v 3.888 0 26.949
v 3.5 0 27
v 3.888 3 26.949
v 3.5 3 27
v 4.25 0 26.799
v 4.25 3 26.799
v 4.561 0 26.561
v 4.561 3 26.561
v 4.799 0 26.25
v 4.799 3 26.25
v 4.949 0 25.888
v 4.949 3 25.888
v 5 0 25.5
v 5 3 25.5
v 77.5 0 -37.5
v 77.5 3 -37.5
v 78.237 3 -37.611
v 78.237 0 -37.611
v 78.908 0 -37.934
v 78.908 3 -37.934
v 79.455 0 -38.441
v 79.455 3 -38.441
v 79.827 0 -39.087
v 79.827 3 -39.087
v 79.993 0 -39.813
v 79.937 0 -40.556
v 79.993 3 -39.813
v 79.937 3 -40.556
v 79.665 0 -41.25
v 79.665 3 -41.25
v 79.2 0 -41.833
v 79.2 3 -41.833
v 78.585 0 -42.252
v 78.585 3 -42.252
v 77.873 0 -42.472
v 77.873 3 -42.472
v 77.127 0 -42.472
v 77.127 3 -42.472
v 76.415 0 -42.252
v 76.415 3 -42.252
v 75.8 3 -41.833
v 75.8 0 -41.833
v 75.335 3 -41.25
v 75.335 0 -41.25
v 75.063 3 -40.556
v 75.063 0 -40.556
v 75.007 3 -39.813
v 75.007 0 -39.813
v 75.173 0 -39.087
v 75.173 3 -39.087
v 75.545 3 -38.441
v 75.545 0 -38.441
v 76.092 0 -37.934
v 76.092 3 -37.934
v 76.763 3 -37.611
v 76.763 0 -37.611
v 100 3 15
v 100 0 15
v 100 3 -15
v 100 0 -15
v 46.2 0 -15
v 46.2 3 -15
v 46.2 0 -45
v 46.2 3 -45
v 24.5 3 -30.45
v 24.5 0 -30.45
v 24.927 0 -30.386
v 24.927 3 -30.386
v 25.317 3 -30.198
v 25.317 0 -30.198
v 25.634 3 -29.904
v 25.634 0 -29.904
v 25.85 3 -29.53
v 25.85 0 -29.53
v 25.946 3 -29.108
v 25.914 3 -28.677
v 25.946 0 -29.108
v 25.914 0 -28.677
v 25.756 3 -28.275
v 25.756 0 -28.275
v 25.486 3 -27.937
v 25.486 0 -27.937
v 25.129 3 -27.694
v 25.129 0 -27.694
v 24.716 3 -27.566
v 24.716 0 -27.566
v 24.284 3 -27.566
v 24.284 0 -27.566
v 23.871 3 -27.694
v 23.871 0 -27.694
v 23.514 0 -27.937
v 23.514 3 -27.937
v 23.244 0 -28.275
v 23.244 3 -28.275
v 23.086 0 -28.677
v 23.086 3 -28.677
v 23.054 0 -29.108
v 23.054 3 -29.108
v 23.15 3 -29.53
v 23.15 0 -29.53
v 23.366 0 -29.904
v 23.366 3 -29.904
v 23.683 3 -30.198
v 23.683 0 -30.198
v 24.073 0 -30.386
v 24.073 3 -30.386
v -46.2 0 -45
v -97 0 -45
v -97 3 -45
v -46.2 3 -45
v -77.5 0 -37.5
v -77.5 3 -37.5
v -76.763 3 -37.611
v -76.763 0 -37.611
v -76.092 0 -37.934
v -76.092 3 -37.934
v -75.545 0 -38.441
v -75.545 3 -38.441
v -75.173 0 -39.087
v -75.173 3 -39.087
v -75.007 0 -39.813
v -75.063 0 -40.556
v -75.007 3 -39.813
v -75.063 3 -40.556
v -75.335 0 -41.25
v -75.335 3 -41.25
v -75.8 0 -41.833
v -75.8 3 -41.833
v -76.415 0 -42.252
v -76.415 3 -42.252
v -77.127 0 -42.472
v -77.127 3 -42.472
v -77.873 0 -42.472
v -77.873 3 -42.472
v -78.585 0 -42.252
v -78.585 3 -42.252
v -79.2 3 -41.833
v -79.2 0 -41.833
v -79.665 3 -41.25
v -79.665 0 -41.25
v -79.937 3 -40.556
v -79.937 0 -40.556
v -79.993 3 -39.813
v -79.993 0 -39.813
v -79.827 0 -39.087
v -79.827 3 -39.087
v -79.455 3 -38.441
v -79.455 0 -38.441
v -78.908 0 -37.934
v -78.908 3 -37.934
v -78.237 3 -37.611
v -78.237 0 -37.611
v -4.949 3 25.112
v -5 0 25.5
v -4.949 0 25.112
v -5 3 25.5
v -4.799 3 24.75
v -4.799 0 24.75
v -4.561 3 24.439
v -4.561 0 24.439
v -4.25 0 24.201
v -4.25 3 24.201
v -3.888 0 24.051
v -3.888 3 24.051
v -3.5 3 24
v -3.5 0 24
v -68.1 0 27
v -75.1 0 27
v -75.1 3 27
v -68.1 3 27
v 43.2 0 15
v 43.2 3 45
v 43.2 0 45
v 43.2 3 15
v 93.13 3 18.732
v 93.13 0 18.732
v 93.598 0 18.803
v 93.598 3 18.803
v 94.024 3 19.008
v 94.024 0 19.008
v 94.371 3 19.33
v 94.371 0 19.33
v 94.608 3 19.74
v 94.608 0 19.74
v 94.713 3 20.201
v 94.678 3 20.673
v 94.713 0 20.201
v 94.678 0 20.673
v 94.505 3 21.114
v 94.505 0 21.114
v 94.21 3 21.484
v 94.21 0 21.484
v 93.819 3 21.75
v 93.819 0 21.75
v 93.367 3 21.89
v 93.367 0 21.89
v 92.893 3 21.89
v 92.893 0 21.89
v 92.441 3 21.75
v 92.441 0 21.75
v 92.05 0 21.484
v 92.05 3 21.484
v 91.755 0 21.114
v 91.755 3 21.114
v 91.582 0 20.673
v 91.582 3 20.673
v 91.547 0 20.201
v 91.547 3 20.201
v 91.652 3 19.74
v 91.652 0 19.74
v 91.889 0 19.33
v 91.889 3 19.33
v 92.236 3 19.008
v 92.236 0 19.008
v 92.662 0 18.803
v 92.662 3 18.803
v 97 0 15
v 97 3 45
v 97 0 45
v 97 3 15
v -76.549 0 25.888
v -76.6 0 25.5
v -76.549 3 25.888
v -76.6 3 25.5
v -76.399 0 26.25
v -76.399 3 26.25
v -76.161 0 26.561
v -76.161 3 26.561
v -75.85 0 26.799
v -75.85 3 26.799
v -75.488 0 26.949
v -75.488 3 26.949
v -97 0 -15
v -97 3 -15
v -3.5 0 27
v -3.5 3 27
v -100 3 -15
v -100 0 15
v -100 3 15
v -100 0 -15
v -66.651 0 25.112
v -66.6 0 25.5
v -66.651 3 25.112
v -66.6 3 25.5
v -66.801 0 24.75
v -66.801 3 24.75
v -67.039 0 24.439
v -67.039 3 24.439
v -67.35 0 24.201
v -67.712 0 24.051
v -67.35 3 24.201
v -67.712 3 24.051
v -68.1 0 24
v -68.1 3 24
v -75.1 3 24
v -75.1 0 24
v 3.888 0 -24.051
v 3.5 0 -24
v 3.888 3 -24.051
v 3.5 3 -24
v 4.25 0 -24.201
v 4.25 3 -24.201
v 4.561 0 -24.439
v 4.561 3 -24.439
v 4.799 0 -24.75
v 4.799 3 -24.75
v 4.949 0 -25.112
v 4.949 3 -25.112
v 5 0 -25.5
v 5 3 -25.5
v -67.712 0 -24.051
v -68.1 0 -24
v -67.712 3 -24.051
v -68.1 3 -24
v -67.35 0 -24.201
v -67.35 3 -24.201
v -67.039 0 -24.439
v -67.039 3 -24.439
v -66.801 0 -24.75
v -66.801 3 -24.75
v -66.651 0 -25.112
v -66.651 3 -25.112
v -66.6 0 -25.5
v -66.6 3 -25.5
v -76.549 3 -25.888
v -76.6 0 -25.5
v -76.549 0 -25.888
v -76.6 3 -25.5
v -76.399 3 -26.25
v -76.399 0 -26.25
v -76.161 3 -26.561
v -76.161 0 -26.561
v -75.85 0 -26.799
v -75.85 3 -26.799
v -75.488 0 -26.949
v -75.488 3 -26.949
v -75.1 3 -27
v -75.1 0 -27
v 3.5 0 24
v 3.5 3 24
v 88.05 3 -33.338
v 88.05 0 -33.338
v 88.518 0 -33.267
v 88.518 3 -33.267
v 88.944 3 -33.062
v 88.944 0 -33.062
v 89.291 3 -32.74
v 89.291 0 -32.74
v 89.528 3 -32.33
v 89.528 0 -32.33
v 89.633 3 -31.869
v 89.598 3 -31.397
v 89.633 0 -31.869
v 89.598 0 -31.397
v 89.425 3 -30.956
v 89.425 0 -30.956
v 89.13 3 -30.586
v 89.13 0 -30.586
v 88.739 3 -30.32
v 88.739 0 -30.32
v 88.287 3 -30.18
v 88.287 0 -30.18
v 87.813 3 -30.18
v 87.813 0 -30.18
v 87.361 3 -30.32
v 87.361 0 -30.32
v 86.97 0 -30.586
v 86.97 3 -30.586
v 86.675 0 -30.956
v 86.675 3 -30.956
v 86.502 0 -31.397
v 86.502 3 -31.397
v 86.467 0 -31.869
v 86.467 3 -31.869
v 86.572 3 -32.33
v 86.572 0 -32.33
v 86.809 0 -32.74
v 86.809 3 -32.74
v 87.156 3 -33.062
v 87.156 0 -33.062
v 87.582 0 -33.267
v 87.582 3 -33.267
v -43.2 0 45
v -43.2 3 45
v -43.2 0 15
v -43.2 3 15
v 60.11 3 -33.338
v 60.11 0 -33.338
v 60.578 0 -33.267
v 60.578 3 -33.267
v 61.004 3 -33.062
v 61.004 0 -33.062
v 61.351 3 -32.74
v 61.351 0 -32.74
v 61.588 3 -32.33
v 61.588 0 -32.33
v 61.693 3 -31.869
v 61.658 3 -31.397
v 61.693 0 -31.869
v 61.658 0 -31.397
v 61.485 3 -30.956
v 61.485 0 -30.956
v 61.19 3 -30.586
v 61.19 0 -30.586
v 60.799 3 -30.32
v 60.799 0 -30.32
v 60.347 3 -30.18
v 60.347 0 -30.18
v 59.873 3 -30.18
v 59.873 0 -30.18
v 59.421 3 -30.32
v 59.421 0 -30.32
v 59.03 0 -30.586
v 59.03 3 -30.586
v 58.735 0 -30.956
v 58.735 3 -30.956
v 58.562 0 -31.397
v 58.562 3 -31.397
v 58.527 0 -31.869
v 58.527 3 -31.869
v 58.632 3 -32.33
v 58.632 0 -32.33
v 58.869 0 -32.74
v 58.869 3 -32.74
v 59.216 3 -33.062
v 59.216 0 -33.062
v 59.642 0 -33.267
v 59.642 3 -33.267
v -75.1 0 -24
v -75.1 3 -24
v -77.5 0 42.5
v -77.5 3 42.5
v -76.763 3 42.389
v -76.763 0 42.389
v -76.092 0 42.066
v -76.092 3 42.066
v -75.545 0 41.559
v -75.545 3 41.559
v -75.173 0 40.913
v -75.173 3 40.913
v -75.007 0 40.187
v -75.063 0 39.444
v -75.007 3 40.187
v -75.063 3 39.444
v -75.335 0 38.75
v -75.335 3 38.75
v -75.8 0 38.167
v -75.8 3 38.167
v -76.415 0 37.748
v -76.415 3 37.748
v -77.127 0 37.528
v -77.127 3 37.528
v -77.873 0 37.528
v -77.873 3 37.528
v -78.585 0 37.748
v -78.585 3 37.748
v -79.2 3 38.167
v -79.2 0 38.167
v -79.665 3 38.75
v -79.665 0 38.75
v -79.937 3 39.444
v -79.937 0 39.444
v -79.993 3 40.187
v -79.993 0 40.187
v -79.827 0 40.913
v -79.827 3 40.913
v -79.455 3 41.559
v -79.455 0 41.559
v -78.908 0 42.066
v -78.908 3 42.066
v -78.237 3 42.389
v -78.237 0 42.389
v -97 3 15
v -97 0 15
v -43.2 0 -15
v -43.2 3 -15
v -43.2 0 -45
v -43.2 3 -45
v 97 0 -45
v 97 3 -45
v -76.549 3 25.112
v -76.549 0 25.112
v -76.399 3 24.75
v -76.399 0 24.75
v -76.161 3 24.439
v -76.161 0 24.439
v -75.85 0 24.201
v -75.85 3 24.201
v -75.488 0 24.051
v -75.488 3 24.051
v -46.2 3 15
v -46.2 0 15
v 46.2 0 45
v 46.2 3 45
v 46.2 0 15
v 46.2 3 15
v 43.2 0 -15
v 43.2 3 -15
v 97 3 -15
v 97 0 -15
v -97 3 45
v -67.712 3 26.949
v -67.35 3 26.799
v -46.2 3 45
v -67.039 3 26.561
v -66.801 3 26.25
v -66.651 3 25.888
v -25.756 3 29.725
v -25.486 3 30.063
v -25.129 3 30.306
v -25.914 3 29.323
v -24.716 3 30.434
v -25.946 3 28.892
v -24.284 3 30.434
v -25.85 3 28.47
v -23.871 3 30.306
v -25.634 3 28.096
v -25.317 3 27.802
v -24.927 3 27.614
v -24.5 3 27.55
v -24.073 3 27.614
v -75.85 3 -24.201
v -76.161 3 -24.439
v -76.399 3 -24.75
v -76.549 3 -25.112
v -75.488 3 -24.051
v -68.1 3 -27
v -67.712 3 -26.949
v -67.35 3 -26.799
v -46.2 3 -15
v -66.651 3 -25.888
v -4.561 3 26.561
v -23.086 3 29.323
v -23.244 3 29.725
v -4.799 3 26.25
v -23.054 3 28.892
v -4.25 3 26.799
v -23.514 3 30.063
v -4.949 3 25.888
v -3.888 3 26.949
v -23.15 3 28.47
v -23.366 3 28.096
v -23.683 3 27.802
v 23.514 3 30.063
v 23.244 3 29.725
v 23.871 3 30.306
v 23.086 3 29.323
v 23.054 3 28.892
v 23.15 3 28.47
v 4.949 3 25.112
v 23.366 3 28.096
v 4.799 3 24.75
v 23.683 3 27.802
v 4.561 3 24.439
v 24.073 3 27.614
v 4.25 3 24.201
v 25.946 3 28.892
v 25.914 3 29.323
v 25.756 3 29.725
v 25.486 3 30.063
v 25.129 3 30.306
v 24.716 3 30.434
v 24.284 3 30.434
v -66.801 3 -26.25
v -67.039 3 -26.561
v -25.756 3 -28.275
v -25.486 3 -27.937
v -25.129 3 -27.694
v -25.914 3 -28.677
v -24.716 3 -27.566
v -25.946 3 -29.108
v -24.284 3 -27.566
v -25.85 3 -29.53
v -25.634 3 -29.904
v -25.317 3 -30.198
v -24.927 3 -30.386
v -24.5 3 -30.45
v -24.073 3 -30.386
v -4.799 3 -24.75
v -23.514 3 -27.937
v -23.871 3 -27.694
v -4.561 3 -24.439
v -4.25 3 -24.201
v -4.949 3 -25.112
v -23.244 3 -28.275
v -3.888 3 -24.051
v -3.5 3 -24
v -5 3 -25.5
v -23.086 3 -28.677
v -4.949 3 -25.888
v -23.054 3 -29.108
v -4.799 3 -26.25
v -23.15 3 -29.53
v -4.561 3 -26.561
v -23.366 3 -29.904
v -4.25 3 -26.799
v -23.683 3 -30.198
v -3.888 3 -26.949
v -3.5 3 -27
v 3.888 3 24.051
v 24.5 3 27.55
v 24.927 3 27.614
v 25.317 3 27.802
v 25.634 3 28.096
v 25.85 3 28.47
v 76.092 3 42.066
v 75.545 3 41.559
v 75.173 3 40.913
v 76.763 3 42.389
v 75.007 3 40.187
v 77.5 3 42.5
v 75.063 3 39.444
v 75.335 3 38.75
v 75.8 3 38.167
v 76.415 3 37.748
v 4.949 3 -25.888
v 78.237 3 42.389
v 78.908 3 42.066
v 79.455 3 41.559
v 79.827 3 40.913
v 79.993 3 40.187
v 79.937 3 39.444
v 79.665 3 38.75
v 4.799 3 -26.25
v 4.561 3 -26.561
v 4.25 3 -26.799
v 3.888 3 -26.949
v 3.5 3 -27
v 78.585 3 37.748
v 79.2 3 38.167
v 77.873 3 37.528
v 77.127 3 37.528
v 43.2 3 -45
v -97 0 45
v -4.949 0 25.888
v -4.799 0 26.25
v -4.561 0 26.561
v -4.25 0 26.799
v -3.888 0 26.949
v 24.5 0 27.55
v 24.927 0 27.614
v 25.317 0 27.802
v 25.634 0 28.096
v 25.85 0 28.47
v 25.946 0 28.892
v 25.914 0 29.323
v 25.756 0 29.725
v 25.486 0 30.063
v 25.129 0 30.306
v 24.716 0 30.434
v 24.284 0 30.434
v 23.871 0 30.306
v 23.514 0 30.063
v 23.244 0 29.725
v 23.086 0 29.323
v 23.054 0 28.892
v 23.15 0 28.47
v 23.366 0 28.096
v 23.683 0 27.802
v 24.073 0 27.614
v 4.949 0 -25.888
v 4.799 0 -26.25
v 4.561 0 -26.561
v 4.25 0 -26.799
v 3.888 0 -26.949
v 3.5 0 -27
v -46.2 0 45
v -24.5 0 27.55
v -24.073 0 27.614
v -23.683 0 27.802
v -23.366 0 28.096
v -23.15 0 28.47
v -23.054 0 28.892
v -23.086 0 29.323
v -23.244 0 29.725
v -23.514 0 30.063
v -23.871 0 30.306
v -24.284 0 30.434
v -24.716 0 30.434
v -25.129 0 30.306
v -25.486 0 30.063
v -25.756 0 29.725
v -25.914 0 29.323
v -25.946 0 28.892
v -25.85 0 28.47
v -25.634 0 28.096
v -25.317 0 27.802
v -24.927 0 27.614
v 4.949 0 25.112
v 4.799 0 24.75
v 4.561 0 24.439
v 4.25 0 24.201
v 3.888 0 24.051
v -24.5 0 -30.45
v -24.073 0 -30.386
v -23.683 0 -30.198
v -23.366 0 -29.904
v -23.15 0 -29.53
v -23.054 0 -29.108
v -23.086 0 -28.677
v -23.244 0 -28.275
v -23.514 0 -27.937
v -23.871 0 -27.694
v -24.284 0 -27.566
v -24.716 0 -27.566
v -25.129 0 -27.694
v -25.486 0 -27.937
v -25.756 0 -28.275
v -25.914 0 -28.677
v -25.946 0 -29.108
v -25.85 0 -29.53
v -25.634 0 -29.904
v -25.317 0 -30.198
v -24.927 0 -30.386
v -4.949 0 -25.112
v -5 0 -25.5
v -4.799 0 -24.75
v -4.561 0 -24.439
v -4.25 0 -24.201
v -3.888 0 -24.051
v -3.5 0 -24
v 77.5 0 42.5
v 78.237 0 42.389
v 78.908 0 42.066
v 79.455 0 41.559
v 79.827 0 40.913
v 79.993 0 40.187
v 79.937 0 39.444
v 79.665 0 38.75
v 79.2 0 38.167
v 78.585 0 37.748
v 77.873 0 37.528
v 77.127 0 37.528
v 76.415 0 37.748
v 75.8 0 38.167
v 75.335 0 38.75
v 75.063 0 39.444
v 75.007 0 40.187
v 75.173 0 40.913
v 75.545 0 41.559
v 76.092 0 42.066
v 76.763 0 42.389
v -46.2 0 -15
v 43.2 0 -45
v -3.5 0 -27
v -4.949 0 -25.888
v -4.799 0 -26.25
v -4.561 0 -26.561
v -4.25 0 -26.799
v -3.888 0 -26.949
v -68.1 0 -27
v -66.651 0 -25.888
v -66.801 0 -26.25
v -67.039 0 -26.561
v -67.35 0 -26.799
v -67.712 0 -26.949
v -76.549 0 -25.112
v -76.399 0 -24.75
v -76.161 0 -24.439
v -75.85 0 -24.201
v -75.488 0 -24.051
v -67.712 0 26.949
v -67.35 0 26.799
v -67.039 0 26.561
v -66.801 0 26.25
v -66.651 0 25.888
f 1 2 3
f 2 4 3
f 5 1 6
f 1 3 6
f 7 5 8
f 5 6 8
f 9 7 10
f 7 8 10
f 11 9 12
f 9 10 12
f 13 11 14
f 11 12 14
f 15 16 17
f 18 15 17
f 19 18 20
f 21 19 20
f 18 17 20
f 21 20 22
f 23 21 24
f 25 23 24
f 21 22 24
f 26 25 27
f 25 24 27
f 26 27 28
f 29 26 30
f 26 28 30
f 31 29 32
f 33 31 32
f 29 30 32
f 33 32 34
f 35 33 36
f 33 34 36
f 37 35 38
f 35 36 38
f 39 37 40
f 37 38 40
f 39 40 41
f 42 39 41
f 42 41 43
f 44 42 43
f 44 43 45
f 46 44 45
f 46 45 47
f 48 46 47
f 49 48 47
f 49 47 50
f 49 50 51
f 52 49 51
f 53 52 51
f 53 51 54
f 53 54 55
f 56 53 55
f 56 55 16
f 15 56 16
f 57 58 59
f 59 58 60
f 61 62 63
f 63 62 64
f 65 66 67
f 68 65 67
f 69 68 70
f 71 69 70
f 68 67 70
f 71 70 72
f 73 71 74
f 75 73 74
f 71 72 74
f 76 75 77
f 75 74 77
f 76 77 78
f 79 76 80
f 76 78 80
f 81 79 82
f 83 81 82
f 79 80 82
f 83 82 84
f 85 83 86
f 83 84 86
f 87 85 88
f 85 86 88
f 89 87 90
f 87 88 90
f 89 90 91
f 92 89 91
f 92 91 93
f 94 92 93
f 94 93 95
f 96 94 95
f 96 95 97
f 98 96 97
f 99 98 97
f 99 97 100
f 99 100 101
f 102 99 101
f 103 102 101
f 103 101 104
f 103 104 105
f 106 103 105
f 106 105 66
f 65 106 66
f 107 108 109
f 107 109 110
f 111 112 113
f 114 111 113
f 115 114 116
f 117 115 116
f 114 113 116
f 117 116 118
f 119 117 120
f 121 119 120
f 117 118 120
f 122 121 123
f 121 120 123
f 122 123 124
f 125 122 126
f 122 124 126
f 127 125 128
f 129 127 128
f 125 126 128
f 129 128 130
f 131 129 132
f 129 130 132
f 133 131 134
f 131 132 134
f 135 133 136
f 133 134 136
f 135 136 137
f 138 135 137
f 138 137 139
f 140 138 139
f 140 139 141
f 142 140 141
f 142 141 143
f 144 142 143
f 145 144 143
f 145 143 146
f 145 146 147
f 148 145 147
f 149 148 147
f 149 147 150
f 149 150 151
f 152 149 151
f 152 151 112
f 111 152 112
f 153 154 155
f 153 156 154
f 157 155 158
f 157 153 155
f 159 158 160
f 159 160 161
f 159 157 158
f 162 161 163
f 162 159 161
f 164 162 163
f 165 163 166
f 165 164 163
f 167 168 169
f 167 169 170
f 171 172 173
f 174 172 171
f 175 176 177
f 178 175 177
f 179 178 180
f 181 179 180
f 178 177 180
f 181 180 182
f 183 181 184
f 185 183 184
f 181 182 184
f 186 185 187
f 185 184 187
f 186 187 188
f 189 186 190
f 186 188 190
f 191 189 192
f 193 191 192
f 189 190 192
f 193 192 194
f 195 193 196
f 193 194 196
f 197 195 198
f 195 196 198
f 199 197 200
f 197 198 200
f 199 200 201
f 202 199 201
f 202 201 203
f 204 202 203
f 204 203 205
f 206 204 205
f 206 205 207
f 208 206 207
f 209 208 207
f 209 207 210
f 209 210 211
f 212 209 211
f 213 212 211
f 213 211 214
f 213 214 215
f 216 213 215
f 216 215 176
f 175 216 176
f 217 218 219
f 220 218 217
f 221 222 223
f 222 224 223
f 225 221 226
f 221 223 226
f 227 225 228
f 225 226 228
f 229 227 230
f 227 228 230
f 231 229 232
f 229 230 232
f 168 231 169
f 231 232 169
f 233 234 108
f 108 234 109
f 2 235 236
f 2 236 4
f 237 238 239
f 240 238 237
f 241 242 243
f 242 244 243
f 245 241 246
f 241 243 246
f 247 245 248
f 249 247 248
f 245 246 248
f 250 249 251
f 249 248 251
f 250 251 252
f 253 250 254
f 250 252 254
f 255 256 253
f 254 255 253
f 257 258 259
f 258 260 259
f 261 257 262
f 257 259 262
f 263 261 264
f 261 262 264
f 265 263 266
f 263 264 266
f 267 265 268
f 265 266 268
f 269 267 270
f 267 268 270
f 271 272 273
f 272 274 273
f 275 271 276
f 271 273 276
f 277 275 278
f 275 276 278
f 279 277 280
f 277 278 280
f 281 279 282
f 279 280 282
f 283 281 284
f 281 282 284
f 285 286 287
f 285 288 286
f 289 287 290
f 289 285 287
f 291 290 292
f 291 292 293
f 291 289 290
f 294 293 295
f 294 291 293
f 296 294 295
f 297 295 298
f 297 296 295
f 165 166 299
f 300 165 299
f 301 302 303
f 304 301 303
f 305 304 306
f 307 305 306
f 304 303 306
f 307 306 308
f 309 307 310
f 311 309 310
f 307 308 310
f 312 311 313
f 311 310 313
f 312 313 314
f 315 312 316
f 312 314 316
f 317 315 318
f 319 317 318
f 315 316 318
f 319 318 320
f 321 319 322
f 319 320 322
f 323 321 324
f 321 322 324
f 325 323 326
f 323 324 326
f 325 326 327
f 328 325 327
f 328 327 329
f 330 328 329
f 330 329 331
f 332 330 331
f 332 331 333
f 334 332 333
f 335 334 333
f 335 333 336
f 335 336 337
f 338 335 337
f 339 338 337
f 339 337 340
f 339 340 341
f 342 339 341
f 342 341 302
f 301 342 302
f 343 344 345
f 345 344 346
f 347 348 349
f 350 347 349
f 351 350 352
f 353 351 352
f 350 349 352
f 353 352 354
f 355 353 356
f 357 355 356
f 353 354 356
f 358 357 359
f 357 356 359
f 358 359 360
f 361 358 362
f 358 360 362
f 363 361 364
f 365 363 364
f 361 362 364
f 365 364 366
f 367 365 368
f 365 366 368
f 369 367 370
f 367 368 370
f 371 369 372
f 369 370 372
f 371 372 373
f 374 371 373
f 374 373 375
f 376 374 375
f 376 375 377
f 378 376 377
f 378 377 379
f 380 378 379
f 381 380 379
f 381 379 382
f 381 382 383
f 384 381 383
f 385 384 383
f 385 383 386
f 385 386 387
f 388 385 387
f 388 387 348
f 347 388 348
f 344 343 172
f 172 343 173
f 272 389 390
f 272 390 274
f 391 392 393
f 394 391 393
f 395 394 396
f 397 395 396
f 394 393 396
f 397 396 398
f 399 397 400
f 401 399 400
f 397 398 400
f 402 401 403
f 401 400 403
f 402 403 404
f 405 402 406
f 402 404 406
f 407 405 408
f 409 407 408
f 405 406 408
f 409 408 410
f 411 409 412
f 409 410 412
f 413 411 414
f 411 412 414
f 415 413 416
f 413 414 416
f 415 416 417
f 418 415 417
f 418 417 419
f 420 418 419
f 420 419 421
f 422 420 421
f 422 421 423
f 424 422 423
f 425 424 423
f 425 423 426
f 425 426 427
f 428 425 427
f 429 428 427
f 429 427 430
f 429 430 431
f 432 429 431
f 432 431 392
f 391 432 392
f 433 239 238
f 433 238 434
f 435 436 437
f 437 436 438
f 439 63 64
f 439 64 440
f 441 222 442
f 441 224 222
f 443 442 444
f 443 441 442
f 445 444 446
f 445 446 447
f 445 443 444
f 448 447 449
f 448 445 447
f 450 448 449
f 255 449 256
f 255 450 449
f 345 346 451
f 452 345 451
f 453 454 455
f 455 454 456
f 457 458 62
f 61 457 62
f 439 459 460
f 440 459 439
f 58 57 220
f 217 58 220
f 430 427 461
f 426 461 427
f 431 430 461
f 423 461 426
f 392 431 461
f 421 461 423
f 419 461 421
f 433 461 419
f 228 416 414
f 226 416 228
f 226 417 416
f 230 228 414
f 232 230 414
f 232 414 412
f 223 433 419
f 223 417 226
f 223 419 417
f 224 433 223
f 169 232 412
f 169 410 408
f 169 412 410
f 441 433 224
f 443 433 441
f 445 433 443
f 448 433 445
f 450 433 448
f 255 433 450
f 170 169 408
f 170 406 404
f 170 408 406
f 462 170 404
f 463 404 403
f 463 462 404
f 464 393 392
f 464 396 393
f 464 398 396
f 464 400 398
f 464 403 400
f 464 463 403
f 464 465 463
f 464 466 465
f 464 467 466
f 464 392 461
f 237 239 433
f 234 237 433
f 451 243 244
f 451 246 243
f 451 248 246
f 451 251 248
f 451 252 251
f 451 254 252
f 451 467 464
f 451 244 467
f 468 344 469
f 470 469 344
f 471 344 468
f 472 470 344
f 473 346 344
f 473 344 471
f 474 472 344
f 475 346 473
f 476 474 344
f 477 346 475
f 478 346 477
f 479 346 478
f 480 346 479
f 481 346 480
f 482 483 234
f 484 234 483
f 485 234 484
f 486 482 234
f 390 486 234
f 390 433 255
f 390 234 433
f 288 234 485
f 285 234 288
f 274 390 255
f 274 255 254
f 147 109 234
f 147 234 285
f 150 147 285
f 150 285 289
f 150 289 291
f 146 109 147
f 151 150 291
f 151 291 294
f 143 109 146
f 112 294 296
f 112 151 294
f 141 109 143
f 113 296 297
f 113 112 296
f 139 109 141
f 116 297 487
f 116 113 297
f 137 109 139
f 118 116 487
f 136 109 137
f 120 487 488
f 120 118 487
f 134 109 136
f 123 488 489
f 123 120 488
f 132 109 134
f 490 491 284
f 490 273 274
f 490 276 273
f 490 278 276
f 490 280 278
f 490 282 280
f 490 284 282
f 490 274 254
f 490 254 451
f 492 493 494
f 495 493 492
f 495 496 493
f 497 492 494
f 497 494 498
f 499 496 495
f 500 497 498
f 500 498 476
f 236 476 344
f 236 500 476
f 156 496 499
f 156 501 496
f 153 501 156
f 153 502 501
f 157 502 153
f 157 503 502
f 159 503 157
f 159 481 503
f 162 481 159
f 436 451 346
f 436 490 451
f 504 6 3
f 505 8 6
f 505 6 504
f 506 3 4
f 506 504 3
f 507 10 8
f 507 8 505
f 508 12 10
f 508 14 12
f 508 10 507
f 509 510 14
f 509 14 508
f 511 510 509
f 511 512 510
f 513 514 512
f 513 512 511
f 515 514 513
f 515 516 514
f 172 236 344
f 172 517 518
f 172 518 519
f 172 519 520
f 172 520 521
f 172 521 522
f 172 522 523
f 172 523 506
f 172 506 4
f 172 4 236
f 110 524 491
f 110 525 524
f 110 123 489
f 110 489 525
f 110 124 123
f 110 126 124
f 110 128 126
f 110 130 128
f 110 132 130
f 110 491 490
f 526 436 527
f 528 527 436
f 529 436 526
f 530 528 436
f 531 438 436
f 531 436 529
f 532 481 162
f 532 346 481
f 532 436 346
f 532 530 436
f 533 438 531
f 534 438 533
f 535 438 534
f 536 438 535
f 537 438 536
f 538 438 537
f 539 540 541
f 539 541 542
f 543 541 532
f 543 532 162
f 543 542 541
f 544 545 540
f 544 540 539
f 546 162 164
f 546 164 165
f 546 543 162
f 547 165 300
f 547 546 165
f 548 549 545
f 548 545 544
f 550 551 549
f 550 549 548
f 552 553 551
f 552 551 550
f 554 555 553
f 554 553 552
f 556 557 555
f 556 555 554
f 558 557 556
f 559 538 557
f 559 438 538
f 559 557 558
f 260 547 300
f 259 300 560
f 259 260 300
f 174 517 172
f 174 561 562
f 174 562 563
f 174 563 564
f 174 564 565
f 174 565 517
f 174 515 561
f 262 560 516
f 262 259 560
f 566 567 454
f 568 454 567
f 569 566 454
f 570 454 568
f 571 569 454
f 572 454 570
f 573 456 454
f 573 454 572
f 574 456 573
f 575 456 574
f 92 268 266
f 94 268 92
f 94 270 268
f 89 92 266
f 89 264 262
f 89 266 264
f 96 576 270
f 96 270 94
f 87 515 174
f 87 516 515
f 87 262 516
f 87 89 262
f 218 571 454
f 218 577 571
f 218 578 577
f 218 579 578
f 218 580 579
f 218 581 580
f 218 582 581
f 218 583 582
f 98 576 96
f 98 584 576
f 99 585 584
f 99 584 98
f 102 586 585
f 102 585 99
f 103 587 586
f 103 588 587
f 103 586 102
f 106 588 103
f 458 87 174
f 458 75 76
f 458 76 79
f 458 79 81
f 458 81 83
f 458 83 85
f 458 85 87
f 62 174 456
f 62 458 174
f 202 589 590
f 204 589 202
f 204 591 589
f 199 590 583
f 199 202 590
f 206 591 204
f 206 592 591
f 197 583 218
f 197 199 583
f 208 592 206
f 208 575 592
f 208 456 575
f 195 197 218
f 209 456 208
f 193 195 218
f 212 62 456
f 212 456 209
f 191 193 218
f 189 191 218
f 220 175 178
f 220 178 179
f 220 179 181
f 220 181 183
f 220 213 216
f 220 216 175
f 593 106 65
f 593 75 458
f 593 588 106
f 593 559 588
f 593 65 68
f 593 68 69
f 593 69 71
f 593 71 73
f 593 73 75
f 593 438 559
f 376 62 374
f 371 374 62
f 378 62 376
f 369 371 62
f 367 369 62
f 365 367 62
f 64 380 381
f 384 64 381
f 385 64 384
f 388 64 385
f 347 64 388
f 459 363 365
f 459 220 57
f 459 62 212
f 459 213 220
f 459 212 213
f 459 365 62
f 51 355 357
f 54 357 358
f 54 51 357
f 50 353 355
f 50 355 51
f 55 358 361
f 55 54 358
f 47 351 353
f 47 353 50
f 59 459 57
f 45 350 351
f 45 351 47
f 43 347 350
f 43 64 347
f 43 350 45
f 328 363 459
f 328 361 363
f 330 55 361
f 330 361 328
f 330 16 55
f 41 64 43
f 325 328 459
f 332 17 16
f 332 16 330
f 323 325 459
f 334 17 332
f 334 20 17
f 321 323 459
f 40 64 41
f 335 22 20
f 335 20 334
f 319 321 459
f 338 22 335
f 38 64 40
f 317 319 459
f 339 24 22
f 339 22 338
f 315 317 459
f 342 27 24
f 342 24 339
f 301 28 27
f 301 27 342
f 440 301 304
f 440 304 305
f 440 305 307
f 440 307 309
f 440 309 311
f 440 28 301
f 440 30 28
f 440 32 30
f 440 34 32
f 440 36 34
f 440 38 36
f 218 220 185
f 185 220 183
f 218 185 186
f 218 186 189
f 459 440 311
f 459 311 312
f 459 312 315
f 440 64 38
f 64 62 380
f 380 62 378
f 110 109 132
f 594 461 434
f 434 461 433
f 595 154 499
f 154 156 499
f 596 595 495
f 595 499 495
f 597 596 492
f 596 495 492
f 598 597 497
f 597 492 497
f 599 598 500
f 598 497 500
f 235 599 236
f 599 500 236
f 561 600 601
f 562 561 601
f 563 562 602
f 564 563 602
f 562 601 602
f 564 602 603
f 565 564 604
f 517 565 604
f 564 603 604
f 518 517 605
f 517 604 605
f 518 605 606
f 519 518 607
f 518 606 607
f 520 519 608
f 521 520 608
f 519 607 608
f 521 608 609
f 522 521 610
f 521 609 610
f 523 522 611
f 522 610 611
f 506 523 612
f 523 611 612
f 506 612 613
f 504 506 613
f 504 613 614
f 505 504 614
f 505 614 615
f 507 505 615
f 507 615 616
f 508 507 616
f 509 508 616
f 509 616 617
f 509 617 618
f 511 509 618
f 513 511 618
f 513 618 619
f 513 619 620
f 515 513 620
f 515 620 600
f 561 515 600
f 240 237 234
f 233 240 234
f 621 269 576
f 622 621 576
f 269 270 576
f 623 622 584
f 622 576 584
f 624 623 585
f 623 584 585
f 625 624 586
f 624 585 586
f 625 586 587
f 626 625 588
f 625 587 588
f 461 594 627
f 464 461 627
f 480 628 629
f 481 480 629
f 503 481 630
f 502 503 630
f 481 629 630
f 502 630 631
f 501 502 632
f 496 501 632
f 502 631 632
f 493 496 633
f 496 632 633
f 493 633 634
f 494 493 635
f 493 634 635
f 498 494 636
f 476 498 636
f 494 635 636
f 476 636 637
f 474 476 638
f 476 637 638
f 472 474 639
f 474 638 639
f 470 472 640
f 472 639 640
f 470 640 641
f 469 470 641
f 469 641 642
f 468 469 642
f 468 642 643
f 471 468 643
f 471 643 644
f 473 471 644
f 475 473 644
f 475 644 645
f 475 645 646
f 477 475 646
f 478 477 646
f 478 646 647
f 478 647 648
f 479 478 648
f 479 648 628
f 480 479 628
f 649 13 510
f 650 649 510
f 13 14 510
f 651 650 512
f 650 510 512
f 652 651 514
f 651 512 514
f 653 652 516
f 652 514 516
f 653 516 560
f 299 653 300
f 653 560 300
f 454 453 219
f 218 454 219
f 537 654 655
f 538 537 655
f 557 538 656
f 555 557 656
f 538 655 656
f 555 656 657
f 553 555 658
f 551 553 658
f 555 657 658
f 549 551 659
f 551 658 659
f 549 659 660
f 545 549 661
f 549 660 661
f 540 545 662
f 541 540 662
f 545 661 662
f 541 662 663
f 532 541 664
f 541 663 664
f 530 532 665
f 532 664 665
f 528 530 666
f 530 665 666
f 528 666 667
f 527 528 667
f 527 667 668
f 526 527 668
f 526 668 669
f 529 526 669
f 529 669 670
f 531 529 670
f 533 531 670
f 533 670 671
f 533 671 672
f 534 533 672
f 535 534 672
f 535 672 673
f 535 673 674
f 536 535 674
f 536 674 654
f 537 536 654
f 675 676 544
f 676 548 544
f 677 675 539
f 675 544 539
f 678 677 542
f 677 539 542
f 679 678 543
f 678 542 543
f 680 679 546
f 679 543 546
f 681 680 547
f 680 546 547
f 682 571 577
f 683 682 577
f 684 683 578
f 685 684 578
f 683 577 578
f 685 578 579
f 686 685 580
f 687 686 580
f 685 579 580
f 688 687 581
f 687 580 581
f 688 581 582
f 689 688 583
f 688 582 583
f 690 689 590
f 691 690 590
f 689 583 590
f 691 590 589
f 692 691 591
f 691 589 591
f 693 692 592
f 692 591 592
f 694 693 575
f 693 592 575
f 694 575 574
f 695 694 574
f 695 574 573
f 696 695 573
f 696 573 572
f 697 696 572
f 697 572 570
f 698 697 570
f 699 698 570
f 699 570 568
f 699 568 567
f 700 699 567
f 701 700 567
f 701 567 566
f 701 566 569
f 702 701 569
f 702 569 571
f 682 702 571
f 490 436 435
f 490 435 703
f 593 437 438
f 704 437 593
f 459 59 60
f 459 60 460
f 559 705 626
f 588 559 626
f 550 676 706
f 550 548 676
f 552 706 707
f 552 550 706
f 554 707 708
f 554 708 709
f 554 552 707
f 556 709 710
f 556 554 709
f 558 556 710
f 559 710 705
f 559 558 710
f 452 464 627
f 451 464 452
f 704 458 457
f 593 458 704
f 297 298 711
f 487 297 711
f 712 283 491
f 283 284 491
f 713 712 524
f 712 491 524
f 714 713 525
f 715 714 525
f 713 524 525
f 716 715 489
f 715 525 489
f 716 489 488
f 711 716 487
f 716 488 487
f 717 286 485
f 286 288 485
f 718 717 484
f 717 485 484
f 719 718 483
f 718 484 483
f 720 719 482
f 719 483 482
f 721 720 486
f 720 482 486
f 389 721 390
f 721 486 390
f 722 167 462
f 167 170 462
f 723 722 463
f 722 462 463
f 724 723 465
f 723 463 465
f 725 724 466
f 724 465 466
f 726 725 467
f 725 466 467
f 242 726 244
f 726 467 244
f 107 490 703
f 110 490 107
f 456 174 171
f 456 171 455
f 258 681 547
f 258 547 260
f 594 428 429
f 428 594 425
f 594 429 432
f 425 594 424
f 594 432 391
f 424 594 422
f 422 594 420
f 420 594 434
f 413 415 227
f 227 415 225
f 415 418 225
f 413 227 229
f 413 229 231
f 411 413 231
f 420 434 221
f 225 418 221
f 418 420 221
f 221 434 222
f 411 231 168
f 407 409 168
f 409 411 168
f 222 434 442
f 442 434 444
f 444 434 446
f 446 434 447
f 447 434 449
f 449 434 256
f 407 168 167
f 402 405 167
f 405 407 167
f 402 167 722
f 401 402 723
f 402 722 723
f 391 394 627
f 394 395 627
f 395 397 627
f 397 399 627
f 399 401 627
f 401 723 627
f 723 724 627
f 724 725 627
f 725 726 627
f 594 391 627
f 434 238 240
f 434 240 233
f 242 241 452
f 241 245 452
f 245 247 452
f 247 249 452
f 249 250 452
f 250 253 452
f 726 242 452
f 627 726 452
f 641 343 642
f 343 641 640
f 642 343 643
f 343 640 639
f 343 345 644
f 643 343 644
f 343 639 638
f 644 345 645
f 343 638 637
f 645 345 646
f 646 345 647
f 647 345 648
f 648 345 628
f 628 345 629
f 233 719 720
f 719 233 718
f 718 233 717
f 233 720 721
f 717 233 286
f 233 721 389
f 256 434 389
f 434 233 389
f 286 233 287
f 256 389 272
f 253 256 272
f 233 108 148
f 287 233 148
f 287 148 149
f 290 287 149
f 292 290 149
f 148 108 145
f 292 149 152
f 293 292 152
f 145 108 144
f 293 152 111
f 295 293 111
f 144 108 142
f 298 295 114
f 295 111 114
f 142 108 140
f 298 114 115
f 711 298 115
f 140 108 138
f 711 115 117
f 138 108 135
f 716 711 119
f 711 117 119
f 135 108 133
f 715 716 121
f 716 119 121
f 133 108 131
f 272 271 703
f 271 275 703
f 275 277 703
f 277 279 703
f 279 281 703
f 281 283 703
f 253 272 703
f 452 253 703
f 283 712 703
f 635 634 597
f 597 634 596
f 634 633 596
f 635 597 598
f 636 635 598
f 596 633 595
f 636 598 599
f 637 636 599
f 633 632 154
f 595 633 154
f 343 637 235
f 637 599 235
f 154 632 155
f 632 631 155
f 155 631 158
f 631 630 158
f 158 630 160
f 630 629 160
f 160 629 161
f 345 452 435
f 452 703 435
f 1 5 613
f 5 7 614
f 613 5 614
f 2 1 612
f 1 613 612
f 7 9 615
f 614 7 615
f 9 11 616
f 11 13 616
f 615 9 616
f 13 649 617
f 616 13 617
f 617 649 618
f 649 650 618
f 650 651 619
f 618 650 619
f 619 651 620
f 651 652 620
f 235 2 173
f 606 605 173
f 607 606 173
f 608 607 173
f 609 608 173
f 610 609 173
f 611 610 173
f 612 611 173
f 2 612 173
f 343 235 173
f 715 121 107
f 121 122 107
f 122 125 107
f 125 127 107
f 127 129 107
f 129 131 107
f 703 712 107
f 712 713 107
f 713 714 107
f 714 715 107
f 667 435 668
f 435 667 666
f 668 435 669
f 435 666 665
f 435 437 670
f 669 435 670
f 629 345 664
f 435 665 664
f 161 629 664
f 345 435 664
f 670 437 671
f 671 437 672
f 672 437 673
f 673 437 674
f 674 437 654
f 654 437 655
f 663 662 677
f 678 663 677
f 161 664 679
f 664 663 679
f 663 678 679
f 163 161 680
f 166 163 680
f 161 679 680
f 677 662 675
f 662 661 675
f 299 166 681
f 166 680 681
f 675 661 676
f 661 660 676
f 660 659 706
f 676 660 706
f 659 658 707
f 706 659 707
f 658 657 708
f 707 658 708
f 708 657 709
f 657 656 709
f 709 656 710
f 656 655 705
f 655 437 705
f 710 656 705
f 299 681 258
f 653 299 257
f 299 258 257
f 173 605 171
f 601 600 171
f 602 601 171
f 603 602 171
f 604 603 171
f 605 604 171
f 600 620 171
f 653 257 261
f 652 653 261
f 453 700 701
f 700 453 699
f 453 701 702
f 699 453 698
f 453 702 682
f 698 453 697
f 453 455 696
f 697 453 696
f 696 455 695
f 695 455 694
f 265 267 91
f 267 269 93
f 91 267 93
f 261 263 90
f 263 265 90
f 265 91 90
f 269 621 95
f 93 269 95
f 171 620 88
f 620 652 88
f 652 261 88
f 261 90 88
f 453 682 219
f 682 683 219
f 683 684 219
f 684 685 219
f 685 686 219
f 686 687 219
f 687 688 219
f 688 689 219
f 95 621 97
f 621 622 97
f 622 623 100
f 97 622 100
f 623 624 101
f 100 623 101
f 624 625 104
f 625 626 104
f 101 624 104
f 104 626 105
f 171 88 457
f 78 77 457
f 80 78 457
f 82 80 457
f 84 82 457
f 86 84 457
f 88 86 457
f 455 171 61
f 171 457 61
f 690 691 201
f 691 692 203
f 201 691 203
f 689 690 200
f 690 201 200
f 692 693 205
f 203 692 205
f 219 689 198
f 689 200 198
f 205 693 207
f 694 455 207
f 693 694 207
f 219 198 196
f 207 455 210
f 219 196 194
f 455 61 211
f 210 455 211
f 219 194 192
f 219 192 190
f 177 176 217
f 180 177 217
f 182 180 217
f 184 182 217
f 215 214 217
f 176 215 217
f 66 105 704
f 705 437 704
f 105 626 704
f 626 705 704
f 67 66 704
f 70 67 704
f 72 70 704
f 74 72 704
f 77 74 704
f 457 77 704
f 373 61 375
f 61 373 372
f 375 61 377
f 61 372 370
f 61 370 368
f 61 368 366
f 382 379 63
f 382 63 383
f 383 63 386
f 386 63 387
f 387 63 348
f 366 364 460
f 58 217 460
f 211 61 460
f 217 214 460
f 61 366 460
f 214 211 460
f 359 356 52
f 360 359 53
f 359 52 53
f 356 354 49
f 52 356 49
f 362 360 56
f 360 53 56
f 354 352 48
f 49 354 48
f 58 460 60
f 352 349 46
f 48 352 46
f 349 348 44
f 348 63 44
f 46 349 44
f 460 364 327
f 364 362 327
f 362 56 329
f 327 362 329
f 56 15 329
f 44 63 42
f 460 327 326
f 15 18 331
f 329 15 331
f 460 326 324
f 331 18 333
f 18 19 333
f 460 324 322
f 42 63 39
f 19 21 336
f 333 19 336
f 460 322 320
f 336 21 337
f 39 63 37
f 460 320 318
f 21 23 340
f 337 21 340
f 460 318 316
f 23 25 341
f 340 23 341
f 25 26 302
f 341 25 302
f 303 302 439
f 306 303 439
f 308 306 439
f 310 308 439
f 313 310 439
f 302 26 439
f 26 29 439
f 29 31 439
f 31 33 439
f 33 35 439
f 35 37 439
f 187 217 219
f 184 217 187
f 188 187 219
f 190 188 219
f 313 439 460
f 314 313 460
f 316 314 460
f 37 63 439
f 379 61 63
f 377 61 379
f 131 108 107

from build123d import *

# Parameters (mm, degrees)
SKETCH1_W           = 200
SKETCH1_H           = 90
BOSS_EXTRUDE1_DEPTH = 3
SKETCH2_W           = 3
SKETCH2_H           = 30
CUT_EXTRUDE1_DEPTH  = 110.69958979
SKETCH3_W           = 3
SKETCH3_H           = 30
CUT_EXTRUDE2_DEPTH  = 110.69958979
SKETCH4_R           = 1.45
SKETCH4_R_2         = 1.5875
SKETCH4_W           = 10
SKETCH4_H           = 3
CUT_EXTRUDE3_DEPTH  = 110.69958979
FILLET1_R           = 1.5
SKETCH5_R           = 2.5
CUT_EXTRUDE4_DEPTH  = 110.69958979


with BuildPart() as part:
    # Sketch1 → Boss-Extrude1 (new body)
    with BuildSketch(Plane(origin=(0, 0, 0), x_dir=(1, 0, 0), z_dir=(0, 1, 0))):
        Rectangle(SKETCH1_W, SKETCH1_H)
    extrude(amount=BOSS_EXTRUDE1_DEPTH)

    # Sketch2 → Cut-Extrude1 (cut, through all)
    with BuildSketch(Plane(origin=(0, 3, 0), x_dir=(1, 0, 0), z_dir=(0, 1, 0))):
        with Locations((-98.5, 30)):
            Rectangle(SKETCH2_W, SKETCH2_H)
        with Locations((-98.5, -30)):
            Rectangle(SKETCH2_W, SKETCH2_H)
    cut_extrude1 = extrude(amount=-CUT_EXTRUDE1_DEPTH, mode=Mode.SUBTRACT)

    # Mirror1: Cut-Extrude1 across plane
    add(cut_extrude1.mirror(Plane(origin=(0, 0, 0), x_dir=(0, 0, 1), z_dir=(1, 0, 0))), mode=Mode.SUBTRACT)

    # Sketch3 → Cut-Extrude2 (cut, through all)
    with BuildSketch(Plane(origin=(0, 3, 0), x_dir=(1, 0, 0), z_dir=(0, 1, 0))):
        with Locations((44.7, 30)):
            Rectangle(SKETCH3_W, SKETCH3_H)
        with Locations((44.7, -30)):
            Rectangle(SKETCH3_W, SKETCH3_H)
    cut_extrude2 = extrude(amount=-CUT_EXTRUDE2_DEPTH, mode=Mode.SUBTRACT)

    # Mirror2: Cut-Extrude2 across plane
    add(cut_extrude2.mirror(Plane(origin=(0, 0, 0), x_dir=(0, 0, 1), z_dir=(1, 0, 0))), mode=Mode.SUBTRACT)

    # Sketch4 → Cut-Extrude3 (cut, through all)
    with BuildSketch(Plane.XZ):
        with Locations(Location((-24.5, 29, 0), (0, 0, 270))):
            Circle(SKETCH4_R)
        with Locations(Location((24.5, 29, 0), (0, 0, 270))):
            Circle(SKETCH4_R)
        with Locations(Location((24.5, -29, 0), (0, 0, 270))):
            Circle(SKETCH4_R)
        with Locations(Location((-24.5, -29, 0), (0, 0, 270))):
            Circle(SKETCH4_R)
        with Locations(Location((93.13, 20.32, 0), (0, 0, 270))):
            Circle(SKETCH4_R_2)
        with Locations(Location((60.11, -31.75, 0), (0, 0, 270))):
            Circle(SKETCH4_R_2)
        with Locations(Location((88.05, -31.75, 0), (0, 0, 270))):
            Circle(SKETCH4_R_2)
        with Locations((0, 25.5)):
            Rectangle(SKETCH4_W, SKETCH4_H)
        with Locations((0, -25.5)):
            Rectangle(SKETCH4_W, SKETCH4_H)
        with Locations((-71.6, 25.5)):
            Rectangle(SKETCH4_W, SKETCH4_H)
        with Locations((-71.6, -25.5)):
            Rectangle(SKETCH4_W, SKETCH4_H)
    extrude(amount=-CUT_EXTRUDE3_DEPTH, mode=Mode.SUBTRACT)

    # Fillet1
    fillet1_edges = [part.edges().sort_by_distance(p)[0] for p in [
        (-5, 1.5, -27),
        (-5, 1.5, -24),
        (5, 1.5, -24),
        (5, 1.5, -27),
        (-5, 1.5, 24),
        (-5, 1.5, 27),
        (5, 1.5, 27),
        (5, 1.5, 24),
        (-76.6, 1.5, 24),
        (-76.6, 1.5, 27),
        (-66.6, 1.5, 27),
        (-66.6, 1.5, -24),
        (-66.6, 1.5, -27),
        (-76.6, 1.5, -27),
        (-76.6, 1.5, -24),
        (-66.6, 1.5, 24),
    ]]
    fillet(fillet1_edges, radius=FILLET1_R - 0.0001)  # a hair under: the kernel refuses the full size

    # Sketch5 → Cut-Extrude4 (cut, through all)
    with BuildSketch(Plane(origin=(0, 3, 0), x_dir=(1, 0, 0), z_dir=(0, 1, 0))):
        with Locations(Location((-77.5, 40, 0), (0, 0, 270))):
            Circle(SKETCH5_R)
        with Locations(Location((77.5, 40, 0), (0, 0, 270))):
            Circle(SKETCH5_R)
        with Locations(Location((77.5, -40, 0), (0, 0, 270))):
            Circle(SKETCH5_R)
        with Locations(Location((-77.5, -40, 0), (0, 0, 270))):
            Circle(SKETCH5_R)
    extrude(amount=-CUT_EXTRUDE4_DEPTH, mode=Mode.SUBTRACT)


solid = part.part
